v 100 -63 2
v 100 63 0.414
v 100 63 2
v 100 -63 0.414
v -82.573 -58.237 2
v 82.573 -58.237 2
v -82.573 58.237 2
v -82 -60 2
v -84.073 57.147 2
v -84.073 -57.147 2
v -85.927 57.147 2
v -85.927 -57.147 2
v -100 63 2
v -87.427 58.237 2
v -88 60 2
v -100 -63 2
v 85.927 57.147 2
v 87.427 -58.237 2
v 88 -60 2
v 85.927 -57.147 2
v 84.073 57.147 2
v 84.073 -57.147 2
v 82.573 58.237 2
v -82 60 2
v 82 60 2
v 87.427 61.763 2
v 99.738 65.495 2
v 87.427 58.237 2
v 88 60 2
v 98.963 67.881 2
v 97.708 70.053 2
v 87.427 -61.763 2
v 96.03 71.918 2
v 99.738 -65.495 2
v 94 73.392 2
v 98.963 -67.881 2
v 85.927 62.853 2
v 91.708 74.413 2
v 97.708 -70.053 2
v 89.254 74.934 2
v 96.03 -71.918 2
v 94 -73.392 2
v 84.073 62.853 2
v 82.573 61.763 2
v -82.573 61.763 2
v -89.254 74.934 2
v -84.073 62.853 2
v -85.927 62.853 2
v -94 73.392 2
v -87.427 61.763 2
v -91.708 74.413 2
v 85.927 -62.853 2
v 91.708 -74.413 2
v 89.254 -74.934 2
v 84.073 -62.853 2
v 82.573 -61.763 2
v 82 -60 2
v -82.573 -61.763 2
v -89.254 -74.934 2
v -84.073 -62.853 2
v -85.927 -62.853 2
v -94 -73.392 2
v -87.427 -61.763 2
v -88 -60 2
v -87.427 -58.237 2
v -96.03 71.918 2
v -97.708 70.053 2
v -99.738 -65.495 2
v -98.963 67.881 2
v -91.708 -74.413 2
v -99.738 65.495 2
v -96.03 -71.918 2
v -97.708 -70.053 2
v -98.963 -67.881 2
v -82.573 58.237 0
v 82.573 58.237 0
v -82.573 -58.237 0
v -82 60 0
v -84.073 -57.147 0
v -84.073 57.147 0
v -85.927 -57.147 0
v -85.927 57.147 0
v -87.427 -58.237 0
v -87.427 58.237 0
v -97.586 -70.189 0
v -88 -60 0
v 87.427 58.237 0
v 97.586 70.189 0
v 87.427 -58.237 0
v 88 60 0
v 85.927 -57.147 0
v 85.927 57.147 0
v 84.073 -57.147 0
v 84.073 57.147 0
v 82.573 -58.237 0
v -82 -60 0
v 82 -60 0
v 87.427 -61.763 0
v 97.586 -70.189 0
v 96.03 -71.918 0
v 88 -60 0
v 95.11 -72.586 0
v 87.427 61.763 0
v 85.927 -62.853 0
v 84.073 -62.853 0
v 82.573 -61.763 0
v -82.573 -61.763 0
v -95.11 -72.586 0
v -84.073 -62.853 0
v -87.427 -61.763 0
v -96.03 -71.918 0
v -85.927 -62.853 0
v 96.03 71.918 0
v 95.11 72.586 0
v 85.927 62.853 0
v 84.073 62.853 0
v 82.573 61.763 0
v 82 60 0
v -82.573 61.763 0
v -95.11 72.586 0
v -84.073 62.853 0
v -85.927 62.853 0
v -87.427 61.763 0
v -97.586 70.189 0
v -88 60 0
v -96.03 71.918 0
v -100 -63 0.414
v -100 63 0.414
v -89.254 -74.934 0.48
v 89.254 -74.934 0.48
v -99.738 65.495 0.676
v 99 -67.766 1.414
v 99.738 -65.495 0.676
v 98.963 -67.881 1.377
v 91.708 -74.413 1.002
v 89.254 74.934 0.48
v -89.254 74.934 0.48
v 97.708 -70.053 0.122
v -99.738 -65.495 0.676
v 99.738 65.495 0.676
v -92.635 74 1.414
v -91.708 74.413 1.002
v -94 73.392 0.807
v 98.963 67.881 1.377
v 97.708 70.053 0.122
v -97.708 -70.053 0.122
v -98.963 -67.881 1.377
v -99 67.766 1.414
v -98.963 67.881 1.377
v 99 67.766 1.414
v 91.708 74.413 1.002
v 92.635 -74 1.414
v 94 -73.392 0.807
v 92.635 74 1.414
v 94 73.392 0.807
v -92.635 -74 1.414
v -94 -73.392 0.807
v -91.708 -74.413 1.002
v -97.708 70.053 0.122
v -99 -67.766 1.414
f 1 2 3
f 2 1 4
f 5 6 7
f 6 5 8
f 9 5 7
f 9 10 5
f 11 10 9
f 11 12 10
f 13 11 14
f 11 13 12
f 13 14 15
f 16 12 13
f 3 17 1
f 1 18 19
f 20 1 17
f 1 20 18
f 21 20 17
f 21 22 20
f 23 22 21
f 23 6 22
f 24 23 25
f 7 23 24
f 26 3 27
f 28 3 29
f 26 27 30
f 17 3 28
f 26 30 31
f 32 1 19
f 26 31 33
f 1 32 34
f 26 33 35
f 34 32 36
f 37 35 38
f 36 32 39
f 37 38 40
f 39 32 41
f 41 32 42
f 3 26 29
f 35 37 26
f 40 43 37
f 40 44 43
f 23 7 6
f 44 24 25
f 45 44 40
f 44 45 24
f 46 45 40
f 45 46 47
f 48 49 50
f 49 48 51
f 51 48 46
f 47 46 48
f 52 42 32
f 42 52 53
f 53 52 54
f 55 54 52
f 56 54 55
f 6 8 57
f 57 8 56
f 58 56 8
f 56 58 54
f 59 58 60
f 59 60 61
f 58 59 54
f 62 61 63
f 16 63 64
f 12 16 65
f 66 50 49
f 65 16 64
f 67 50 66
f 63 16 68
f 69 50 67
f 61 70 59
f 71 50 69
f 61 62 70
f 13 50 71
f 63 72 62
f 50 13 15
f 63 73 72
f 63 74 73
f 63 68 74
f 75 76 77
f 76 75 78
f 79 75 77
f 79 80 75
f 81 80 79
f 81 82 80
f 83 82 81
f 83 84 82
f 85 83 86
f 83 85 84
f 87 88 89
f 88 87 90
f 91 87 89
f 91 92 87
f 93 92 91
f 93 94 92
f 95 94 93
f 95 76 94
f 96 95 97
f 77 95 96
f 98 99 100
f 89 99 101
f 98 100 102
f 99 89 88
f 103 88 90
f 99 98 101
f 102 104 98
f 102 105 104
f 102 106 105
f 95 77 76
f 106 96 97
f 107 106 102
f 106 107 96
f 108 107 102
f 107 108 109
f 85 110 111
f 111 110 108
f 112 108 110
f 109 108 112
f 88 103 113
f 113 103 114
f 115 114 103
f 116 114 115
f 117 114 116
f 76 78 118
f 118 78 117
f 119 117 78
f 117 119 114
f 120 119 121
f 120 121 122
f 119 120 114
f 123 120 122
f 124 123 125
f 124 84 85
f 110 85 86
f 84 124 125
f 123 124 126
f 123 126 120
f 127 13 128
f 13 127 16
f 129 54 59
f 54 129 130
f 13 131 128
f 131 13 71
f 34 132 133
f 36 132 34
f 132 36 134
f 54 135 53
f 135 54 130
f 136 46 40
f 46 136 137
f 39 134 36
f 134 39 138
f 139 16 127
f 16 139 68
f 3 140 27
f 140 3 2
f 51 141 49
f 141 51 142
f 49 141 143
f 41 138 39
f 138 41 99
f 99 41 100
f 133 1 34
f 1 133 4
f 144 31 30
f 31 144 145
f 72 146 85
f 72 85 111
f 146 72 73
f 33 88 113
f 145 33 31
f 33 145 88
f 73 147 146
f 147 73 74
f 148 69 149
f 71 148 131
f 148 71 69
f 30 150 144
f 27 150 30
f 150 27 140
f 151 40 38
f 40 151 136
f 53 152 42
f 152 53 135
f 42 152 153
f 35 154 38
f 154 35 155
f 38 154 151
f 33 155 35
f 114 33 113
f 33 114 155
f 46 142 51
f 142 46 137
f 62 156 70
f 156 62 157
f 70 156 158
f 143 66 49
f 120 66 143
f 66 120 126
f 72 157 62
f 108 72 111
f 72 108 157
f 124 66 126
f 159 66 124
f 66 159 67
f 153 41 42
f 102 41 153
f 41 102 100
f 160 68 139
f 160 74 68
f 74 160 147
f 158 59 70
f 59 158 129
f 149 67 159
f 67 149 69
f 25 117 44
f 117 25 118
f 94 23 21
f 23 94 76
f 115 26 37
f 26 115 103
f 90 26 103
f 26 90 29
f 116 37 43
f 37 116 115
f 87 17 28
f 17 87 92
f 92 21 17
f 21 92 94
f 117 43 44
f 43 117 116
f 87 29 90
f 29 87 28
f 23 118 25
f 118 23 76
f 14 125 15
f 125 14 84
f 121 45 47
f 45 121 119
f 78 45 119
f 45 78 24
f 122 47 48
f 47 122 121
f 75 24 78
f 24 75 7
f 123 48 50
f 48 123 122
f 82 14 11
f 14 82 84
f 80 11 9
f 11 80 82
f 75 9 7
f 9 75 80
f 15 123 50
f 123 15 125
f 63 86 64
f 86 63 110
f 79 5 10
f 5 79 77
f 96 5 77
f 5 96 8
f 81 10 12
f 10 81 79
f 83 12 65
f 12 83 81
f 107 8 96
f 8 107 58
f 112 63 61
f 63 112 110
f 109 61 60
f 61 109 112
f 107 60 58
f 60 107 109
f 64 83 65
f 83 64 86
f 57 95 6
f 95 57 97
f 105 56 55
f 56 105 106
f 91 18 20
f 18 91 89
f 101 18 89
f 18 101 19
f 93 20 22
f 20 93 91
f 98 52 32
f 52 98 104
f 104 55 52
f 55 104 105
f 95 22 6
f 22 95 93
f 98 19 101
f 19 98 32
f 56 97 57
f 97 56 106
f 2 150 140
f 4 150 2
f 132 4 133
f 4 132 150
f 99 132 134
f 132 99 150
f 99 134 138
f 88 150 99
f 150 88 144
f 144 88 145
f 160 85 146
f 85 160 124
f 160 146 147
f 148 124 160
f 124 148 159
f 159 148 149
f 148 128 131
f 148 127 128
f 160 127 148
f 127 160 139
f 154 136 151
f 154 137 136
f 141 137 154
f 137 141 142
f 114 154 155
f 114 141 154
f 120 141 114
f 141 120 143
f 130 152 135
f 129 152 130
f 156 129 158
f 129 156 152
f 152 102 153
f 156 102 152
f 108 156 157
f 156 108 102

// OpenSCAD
// Parameters
sheet_length = 200; //[100:400:1]
sheet_width = 150; //[75:300:1]
sheet_thickness = 2; //[1:6:0.5]
corner_radius = 12; //[6:24:1]
hole_diameter = 6; //[3:12:0.5]
hole_edge_offset = 15; //[8:30:1]
chamfer_size = 1; //[0.5:3:0.25]
overlap = 1; //[0.5:2:0.1]

// Base Shapes
module sheet_body() {
  translate([0, 0, sheet_thickness/2])
    cube([sheet_length, sheet_width, sheet_thickness], center=true);
}

module rounded_corner_cyl(pos) {
  translate(pos)
    cylinder(r=corner_radius, h=sheet_thickness + 2*overlap, center=true);
}

module mounting_hole(pos) {
  translate(pos)
    cylinder(r=hole_diameter/2, h=sheet_thickness + 4*overlap, center=true);
}

module chamfer_cut_x(pos) {
  translate(pos)
    rotate([0, 45, 0])
      cube([chamfer_size*2, sheet_width + 2*overlap, chamfer_size*2], center=true);
}

module chamfer_cut_y(pos) {
  translate(pos)
    rotate([45, 0, 0])
      cube([sheet_length + 2*overlap, chamfer_size*2, chamfer_size*2], center=true);
}

// Operations
module rounded_corners() {
  hull() {
    rounded_corner_cyl([sheet_length/2 - corner_radius, sheet_width/2 - corner_radius, 0]);
    rounded_corner_cyl([-sheet_length/2 + corner_radius, sheet_width/2 - corner_radius, 0]);
    rounded_corner_cyl([-sheet_length/2 + corner_radius, -sheet_width/2 + corner_radius, 0]);
    rounded_corner_cyl([sheet_length/2 - corner_radius, -sheet_width/2 + corner_radius, 0]);
  }
}

module sheet_with_rounded_corners() {
  intersection() {
    sheet_body();
    rounded_corners();
  }
}

module mounting_holes() {
  union() {
    mounting_hole([sheet_length/2 - hole_edge_offset, sheet_width/2 - hole_edge_offset, 0]);
    mounting_hole([-sheet_length/2 + hole_edge_offset, sheet_width/2 - hole_edge_offset, 0]);
    mounting_hole([-sheet_length/2 + hole_edge_offset, -sheet_width/2 + hole_edge_offset, 0]);
    mounting_hole([sheet_length/2 - hole_edge_offset, -sheet_width/2 + hole_edge_offset, 0]);
  }
}

module chamfer_edges() {
  union() {
    chamfer_cut_x([sheet_length/2 - chamfer_size, 0, sheet_thickness/2 - chamfer_size]);
    chamfer_cut_x([-sheet_length/2 + chamfer_size, 0, sheet_thickness/2 - chamfer_size]);
    chamfer_cut_y([0, sheet_width/2 - chamfer_size, sheet_thickness/2 - chamfer_size]);
    chamfer_cut_y([0, -sheet_width/2 + chamfer_size, sheet_thickness/2 - chamfer_size]);
  }
}

// Final Output
difference() {
  sheet_with_rounded_corners();
  mounting_holes();
  chamfer_edges();
}
